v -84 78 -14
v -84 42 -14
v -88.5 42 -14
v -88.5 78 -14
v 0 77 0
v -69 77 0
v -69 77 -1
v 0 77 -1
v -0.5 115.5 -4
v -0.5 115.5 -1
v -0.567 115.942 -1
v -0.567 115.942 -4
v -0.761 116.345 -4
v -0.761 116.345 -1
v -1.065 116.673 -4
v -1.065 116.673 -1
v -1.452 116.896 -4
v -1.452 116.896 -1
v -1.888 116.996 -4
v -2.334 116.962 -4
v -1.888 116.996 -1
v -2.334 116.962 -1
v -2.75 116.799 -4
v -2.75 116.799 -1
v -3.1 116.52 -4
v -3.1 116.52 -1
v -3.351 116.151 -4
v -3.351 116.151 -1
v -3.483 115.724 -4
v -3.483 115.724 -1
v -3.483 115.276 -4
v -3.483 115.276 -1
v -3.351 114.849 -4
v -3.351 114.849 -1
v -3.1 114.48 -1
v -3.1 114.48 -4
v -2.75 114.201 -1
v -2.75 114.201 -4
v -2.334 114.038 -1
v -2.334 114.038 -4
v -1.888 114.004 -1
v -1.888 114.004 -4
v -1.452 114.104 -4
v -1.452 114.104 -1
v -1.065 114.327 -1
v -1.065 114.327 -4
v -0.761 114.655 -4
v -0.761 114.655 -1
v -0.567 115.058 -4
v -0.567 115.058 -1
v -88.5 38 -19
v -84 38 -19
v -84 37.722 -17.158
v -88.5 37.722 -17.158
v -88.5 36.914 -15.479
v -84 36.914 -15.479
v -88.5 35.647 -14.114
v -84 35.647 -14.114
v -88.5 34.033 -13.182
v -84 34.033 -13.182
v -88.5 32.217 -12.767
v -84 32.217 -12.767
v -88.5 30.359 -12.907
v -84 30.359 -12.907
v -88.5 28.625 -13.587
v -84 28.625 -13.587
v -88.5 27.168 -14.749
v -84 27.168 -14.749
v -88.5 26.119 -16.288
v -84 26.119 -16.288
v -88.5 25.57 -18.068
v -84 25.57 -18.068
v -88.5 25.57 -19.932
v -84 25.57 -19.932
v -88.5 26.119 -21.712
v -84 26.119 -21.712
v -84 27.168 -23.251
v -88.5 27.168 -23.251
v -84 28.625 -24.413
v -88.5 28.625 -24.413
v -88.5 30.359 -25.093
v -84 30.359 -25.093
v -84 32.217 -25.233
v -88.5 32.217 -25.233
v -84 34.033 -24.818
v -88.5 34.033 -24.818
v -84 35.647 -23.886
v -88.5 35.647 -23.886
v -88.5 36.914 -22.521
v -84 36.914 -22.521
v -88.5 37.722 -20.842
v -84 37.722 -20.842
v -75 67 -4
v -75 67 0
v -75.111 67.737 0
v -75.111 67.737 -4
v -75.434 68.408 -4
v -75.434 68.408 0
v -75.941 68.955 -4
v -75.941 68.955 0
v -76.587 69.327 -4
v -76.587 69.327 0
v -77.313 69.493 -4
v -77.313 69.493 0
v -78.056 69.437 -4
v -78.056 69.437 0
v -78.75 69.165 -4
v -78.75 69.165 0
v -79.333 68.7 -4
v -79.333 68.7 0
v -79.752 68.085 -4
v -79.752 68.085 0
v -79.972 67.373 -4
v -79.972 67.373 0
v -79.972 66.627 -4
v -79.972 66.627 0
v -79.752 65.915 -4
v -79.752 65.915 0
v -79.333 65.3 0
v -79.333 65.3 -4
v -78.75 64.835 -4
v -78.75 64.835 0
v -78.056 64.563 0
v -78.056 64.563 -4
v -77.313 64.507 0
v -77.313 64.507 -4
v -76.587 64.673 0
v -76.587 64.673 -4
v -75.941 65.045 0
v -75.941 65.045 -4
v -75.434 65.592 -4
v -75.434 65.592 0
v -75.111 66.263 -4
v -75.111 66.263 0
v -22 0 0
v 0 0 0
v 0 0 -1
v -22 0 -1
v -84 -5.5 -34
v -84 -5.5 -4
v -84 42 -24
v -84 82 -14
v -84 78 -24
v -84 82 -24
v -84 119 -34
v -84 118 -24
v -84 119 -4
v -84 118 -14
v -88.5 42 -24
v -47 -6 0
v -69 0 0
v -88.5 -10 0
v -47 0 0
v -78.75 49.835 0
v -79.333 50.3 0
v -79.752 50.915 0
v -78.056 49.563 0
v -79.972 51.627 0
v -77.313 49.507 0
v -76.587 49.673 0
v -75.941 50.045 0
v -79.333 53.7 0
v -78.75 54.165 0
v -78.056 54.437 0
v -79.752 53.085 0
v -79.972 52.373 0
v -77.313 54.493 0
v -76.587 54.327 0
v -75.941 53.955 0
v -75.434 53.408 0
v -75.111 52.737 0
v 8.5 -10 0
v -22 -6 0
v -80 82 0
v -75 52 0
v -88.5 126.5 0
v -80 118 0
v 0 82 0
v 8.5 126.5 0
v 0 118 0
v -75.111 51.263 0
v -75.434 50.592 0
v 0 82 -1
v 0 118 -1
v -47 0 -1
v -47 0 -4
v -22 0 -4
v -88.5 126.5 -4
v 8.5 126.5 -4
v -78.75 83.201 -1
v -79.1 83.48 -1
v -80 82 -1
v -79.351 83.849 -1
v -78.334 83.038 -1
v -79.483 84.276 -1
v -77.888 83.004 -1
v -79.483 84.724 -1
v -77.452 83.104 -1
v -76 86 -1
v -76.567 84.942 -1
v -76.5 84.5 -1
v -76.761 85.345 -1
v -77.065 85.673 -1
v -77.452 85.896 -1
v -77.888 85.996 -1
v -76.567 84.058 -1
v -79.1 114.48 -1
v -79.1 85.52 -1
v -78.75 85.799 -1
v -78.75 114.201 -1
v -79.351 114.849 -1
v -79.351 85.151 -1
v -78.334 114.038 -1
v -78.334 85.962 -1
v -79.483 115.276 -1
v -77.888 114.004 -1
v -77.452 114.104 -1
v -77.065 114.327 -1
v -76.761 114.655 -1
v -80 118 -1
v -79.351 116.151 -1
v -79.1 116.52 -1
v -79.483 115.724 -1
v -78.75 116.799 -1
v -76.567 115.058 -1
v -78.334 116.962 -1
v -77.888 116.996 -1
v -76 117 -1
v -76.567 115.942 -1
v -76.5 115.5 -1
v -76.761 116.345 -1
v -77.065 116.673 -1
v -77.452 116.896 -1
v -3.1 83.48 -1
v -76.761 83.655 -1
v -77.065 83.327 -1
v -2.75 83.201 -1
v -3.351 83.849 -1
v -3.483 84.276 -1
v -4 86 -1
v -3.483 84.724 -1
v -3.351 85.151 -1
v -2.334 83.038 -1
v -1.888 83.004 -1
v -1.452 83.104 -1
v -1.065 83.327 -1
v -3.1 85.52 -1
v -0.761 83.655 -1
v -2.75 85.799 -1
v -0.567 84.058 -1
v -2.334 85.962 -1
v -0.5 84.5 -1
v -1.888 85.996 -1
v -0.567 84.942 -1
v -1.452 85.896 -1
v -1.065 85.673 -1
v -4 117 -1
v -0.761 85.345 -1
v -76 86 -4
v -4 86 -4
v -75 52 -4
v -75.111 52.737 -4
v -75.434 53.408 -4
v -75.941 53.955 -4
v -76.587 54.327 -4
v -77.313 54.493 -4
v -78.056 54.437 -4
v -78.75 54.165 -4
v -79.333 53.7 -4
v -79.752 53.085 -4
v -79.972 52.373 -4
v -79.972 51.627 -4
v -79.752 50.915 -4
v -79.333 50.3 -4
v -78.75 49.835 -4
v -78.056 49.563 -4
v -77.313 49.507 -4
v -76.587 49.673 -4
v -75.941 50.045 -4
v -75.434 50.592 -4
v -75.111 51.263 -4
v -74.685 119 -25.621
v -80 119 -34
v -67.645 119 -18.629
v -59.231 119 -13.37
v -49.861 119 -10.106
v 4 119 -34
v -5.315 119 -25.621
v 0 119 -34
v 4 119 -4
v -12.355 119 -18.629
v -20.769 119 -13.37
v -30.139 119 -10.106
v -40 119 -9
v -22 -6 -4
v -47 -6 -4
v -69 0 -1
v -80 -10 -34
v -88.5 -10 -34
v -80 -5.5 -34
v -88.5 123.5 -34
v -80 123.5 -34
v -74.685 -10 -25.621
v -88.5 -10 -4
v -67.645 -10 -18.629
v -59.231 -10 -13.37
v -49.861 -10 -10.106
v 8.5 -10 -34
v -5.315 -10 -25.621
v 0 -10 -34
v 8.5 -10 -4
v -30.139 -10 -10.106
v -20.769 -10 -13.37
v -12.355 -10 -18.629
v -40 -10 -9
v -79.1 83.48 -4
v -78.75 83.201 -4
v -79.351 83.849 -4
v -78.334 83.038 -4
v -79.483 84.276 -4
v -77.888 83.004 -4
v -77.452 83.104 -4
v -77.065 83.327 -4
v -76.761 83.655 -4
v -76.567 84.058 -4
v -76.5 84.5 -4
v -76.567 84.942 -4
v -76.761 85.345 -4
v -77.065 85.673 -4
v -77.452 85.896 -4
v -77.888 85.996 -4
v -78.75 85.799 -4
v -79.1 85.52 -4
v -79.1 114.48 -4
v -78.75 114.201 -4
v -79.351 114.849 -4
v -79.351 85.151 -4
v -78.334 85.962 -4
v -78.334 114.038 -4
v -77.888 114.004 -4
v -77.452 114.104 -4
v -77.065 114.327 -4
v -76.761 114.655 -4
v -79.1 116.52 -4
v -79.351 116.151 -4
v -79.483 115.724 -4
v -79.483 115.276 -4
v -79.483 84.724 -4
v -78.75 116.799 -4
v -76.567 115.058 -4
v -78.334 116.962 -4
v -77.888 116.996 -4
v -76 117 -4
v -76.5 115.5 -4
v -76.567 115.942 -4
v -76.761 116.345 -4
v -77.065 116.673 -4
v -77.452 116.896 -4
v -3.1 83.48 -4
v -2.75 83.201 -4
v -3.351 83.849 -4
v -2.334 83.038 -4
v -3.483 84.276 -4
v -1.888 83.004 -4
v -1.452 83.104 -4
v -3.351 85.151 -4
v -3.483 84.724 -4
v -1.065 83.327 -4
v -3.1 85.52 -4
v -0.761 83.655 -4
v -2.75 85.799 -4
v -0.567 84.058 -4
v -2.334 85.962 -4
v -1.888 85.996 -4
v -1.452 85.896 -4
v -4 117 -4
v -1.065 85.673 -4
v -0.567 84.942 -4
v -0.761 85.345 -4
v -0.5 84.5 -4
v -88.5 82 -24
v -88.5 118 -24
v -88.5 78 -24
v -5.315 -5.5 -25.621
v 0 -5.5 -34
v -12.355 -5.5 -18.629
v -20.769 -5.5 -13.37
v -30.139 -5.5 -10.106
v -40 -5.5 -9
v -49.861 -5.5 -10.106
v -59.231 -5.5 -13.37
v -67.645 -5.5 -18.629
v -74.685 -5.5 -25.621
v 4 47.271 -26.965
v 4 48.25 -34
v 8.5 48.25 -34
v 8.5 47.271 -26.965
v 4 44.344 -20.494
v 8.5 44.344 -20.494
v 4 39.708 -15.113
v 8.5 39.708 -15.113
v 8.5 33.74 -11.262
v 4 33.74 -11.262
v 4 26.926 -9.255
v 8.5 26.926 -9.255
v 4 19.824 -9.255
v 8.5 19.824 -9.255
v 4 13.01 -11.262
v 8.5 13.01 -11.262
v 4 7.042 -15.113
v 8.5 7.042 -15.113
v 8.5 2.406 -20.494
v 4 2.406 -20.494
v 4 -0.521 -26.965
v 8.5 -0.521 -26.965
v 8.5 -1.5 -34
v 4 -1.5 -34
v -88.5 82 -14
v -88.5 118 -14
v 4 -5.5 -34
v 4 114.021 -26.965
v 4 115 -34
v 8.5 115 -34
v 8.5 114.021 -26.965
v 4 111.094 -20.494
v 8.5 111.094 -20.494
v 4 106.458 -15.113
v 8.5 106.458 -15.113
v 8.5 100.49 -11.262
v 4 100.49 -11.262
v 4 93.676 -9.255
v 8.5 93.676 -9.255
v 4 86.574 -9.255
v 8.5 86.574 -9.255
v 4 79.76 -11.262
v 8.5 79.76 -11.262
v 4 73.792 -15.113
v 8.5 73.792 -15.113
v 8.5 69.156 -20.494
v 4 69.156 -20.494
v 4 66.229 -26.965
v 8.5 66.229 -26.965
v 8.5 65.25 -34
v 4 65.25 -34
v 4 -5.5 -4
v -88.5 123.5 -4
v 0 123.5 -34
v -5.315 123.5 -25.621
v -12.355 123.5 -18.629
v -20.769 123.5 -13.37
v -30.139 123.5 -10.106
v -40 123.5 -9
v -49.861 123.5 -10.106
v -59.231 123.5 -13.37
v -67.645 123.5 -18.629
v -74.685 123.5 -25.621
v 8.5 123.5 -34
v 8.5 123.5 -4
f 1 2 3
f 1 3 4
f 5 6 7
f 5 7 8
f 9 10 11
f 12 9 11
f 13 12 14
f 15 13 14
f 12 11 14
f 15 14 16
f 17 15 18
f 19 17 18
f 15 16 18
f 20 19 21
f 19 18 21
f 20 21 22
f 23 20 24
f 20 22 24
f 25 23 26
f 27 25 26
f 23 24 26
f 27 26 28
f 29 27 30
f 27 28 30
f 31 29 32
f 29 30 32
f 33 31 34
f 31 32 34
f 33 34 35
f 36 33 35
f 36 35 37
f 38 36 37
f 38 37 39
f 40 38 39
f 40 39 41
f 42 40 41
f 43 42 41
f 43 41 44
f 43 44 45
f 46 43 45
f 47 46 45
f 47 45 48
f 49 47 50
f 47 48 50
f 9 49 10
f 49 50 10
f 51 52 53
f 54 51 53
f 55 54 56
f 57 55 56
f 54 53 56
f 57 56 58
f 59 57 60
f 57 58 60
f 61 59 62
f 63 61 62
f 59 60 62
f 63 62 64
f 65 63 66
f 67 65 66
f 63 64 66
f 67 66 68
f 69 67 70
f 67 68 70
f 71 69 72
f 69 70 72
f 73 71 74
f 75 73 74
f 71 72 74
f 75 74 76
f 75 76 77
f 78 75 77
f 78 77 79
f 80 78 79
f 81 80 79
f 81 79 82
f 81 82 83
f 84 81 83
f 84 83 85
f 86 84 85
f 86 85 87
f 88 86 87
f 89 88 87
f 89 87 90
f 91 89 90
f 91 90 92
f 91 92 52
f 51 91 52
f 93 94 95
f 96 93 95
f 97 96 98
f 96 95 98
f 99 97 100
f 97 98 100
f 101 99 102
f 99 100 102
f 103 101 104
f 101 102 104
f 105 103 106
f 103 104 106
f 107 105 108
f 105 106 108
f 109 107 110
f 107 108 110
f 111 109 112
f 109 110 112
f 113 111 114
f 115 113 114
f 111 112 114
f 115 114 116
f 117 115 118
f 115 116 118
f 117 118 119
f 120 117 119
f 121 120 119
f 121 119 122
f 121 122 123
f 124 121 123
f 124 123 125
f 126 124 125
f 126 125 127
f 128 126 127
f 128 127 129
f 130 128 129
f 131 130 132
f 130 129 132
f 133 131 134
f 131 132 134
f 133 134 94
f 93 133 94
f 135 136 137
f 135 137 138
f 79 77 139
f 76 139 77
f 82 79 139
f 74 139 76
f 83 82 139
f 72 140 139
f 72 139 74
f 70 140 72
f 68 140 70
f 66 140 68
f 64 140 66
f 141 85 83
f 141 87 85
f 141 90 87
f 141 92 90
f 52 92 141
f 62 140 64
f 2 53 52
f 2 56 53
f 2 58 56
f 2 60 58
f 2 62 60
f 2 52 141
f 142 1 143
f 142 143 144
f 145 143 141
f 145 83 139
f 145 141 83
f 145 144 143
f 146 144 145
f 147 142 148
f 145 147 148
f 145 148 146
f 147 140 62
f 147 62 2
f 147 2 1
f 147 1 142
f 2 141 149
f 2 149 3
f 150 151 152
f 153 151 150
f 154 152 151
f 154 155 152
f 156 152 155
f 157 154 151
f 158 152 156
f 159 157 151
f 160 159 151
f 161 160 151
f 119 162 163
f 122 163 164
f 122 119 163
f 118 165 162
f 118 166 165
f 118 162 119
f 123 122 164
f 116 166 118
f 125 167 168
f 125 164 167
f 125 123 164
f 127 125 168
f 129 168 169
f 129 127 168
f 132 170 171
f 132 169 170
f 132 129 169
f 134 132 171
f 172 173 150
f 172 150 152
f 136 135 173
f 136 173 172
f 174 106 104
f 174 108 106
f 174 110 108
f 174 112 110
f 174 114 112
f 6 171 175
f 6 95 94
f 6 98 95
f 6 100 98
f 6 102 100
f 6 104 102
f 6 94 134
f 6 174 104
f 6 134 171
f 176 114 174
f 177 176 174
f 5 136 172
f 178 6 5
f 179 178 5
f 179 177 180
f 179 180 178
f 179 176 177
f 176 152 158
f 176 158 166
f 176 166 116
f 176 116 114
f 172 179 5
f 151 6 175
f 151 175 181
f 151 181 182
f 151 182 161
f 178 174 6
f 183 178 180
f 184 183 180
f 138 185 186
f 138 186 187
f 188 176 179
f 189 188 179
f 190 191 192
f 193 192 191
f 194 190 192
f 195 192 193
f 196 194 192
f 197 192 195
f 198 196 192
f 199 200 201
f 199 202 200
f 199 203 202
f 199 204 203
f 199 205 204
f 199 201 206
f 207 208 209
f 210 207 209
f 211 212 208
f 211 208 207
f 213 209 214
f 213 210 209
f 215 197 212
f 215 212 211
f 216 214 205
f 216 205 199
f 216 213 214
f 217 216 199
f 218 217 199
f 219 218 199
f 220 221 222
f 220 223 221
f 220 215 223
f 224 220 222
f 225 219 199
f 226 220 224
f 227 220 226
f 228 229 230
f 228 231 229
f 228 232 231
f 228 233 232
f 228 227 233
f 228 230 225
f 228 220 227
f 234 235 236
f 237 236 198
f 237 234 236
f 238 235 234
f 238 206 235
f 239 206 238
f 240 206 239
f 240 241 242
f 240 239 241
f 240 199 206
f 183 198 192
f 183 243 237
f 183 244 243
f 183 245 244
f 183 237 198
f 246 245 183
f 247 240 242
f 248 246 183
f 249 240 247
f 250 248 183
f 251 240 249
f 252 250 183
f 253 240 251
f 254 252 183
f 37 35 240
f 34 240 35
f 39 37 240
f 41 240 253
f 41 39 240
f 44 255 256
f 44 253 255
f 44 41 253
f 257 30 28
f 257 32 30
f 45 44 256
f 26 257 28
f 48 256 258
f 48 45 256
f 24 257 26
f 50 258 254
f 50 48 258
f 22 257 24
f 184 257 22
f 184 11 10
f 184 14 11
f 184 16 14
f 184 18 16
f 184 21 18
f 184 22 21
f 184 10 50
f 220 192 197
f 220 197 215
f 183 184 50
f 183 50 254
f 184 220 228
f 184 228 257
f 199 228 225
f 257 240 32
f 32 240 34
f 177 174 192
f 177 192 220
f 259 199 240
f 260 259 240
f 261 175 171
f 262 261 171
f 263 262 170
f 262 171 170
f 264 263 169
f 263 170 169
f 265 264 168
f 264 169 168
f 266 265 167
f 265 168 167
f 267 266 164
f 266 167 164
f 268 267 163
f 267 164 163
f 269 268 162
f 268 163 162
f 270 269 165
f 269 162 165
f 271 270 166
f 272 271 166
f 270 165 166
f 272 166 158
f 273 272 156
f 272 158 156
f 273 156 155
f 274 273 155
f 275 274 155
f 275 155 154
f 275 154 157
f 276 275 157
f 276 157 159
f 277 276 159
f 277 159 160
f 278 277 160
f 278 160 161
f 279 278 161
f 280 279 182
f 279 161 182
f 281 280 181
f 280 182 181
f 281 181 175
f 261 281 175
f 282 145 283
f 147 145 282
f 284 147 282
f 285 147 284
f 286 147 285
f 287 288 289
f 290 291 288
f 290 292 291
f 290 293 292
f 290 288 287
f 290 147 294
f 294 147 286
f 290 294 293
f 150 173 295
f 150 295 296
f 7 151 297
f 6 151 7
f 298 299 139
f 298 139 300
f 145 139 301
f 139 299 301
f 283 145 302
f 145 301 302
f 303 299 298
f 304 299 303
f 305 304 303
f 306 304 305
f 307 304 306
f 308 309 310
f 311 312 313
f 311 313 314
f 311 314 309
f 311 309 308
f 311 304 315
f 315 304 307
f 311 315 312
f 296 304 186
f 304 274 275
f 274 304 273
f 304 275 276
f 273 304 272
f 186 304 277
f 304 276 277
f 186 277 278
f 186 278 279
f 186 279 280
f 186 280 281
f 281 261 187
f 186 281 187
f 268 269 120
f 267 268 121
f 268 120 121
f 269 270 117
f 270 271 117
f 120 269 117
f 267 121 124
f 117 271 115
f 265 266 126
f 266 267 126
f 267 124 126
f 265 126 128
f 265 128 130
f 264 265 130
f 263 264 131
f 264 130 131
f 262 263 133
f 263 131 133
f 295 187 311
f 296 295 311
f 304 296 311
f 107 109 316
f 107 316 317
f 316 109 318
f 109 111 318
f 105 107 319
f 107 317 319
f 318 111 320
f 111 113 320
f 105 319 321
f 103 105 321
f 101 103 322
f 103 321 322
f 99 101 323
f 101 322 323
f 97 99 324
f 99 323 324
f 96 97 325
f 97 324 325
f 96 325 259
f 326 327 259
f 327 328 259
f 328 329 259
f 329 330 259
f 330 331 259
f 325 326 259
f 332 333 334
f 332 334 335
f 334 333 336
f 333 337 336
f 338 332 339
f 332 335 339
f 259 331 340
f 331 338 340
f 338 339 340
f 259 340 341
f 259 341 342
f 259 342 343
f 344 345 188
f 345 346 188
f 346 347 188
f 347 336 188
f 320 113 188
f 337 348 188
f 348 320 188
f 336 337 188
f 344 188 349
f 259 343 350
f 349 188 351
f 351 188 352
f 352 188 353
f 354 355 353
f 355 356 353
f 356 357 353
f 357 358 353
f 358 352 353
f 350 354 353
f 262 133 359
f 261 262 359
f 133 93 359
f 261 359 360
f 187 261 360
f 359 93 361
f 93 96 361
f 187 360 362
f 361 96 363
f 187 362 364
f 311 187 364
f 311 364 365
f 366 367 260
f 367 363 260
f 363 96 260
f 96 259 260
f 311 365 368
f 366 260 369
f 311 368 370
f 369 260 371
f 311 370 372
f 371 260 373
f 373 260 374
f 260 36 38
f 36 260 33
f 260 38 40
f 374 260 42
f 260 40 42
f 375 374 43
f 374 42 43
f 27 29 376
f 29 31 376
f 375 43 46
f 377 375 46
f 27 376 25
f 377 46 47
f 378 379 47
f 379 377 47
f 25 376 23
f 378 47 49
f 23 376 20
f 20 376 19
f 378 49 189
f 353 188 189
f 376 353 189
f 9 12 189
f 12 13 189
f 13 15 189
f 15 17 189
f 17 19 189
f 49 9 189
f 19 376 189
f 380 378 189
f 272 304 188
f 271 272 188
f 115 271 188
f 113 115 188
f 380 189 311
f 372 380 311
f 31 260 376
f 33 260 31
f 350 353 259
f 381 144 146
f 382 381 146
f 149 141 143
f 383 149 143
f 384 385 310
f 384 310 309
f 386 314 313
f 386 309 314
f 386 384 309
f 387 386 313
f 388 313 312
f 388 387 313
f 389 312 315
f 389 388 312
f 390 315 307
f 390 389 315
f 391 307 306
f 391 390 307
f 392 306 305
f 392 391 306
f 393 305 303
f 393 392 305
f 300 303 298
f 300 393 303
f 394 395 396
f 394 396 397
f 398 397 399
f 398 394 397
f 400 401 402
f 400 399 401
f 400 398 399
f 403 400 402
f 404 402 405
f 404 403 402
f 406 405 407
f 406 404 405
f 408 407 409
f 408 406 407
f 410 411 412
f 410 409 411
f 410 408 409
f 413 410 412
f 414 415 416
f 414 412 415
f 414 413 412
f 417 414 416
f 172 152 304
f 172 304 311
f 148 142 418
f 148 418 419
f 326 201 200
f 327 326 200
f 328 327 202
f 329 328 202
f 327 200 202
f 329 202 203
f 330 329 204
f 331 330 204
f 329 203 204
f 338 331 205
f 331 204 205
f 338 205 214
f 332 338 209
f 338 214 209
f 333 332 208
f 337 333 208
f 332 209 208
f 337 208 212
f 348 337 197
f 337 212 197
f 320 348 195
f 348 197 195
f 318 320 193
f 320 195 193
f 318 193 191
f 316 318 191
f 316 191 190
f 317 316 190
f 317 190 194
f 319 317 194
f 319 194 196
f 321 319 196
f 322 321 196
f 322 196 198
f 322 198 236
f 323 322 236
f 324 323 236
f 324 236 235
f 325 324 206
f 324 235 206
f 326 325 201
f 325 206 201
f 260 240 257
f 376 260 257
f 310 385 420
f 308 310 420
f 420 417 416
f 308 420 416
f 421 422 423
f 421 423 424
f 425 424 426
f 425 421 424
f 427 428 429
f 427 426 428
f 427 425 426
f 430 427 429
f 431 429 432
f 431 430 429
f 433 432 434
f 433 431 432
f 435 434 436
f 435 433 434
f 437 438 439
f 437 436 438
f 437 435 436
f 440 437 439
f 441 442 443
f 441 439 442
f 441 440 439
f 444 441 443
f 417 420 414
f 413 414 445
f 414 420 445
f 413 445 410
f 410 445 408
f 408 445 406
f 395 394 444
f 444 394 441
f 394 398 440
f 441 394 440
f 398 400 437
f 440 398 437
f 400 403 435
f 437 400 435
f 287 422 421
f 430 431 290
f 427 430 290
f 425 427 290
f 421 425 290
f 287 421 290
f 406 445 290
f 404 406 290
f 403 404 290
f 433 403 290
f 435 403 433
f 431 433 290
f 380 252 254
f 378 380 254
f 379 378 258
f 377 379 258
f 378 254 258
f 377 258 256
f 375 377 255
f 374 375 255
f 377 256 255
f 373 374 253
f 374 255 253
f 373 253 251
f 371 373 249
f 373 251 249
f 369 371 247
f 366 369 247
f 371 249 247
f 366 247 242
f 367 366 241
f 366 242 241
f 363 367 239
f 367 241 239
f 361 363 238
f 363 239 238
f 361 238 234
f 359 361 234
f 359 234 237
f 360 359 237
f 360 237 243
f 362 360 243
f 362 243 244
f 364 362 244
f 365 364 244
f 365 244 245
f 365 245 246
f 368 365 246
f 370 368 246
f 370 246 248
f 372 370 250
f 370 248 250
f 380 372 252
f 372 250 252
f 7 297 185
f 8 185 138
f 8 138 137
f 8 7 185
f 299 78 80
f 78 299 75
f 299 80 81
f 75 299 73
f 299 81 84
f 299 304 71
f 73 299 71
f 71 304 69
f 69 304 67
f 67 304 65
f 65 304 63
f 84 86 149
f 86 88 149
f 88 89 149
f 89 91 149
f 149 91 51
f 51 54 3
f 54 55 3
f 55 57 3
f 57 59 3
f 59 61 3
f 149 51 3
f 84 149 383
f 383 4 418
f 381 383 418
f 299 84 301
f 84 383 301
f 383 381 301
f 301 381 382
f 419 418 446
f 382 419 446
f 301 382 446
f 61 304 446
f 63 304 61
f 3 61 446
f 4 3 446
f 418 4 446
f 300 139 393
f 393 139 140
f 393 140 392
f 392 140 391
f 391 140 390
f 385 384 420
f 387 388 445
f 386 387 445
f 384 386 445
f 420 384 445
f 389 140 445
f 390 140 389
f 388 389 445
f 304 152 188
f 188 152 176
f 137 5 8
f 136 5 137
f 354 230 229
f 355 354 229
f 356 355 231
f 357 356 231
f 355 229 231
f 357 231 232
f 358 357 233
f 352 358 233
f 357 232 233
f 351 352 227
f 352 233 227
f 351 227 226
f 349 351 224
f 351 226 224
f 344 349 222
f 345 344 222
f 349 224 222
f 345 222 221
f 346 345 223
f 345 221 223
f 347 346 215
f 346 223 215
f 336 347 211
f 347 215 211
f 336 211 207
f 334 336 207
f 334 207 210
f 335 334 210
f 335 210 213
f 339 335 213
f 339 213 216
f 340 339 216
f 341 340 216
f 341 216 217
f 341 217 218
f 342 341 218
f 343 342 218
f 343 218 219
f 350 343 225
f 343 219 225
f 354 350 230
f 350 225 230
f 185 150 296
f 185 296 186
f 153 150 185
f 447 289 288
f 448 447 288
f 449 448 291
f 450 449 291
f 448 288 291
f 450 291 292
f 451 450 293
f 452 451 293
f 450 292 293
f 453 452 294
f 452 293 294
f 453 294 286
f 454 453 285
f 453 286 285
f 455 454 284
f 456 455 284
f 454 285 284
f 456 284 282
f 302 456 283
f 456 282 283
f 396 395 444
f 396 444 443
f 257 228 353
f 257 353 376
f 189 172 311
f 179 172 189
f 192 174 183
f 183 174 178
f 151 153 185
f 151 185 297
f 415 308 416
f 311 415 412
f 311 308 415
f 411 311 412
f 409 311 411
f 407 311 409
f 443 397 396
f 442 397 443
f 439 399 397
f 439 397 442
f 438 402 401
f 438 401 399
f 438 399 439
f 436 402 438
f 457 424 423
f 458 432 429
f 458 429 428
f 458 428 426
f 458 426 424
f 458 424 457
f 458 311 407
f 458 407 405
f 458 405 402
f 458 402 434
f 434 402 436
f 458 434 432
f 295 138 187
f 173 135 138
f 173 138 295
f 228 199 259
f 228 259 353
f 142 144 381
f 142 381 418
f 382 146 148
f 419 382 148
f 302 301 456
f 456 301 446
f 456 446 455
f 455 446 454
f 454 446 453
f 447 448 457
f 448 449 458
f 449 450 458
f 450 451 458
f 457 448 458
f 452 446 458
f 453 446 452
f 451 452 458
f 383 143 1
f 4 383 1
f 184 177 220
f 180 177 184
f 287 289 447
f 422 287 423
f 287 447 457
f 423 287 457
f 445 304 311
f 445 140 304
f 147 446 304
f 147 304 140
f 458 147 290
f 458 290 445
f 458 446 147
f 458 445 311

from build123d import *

# Parameters (mm, degrees)
F0_W          = 97
F0_H          = 136.5
F0_R          = 2.5
F0_W_2        = 80
F0_H_2        = 36
F1_DEPTH      = 4
F2_START      = -1
F0_R_2        = 1.5
F0_W_3        = 72
F0_H_3        = 31
F2_DEPTH      = 3
F4_START      = -4
F3_W          = 97
F3_H          = 133.5
F3_W_2        = 88
F3_H_2        = 124.5
F4_DEPTH      = 30
F5_W          = 36
F5_H          = 10
F5_R          = 6.25
F6_DEPTH      = 150
F8_DEPTH      = 171.9
F8_DEPTH_BACK = 25
F10_DEPTH     = 25


with BuildPart() as f1:
    # F0 (on Top) → F1 (new body)
    with BuildSketch(Plane.XY):
        with Locations((-40, 58.25)):
            Rectangle(F0_W, F0_H)
        with Locations((-77.5, 52)):
            Circle(F0_R, mode=Mode.SUBTRACT)
        Polygon((0, 77), (0, 0), (-22, 0), (-22, -6), (-47, -6), (-47, 0), (-69, 0), (-69, 77), align=None, mode=Mode.SUBTRACT)
        with Locations((-77.5, 67)):
            Circle(F0_R, mode=Mode.SUBTRACT)
        with Locations((-40, 100)):
            Rectangle(F0_W_2, F0_H_2, mode=Mode.SUBTRACT)
    extrude(amount=-F1_DEPTH)

    # F0 (on Top) → F2 (join)
    with BuildSketch(Plane.XY.offset(F2_START)):
        Polygon((-22, 0), (0, 0), (0, 77), (-69, 77), (-69, 0), (-47, 0), align=None)
        with Locations((-40, 100)):
            Rectangle(F0_W_2, F0_H_2)
        with Locations((-78, 84.5)):
            Circle(F0_R_2, mode=Mode.SUBTRACT)
        with Locations((-78, 115.5)):
            Circle(F0_R_2, mode=Mode.SUBTRACT)
        with Locations((-2, 84.5)):
            Circle(F0_R_2, mode=Mode.SUBTRACT)
        with Locations((-40, 101.5)):
            Rectangle(F0_W_3, F0_H_3, mode=Mode.SUBTRACT)
        with Locations((-2, 115.5)):
            Circle(F0_R_2, mode=Mode.SUBTRACT)
    extrude(amount=-F2_DEPTH)


with BuildPart() as f4:
    # F3 (on Top) → F4 (new body)
    with BuildSketch(Plane.XY.offset(F4_START)):
        with Locations((-40, 56.75)):
            Rectangle(F3_W, F3_H)
        with Locations((-40, 56.75)):
            Rectangle(F3_W_2, F3_H_2, mode=Mode.SUBTRACT)
    extrude(amount=-F4_DEPTH)

    # F5 (on Right) → F6 (cut)
    with BuildSketch(Plane.YZ):
        with Locations((60, -19)):
            Rectangle(F5_W, F5_H)
        with Locations((100, -19)):
            Rectangle(F5_W, F5_H)
        with Locations((31.75, -19)):
            Circle(F5_R)
    extrude(amount=-F6_DEPTH, mode=Mode.SUBTRACT)

    # F7 (on Front) → F8 (cut, two sides)
    with BuildSketch(Plane.XZ) as f8_sk:
        with BuildLine():
            Line((-80, -34), (0, -34))
            ThreePointArc((0, -34), (-40, -9), (-80, -34))
        make_face()
    extrude(amount=-F8_DEPTH, mode=Mode.SUBTRACT)
    extrude(f8_sk.sketch, amount=F8_DEPTH_BACK, mode=Mode.SUBTRACT)

    # F9 (on Right) → F10 (cut)
    with BuildSketch(Plane.YZ):
        with BuildLine():
            ThreePointArc((48.25, -34), (23.375, -9), (-1.5, -34))
            Line((-1.5, -34), (48.25, -34))
        make_face()
        with BuildLine():
            Line((65.25, -34), (115, -34))
            ThreePointArc((115, -34), (90.125, -9), (65.25, -34))
        make_face()
    extrude(amount=F10_DEPTH, mode=Mode.SUBTRACT)


solid = Compound([f1.part, f4.part])
